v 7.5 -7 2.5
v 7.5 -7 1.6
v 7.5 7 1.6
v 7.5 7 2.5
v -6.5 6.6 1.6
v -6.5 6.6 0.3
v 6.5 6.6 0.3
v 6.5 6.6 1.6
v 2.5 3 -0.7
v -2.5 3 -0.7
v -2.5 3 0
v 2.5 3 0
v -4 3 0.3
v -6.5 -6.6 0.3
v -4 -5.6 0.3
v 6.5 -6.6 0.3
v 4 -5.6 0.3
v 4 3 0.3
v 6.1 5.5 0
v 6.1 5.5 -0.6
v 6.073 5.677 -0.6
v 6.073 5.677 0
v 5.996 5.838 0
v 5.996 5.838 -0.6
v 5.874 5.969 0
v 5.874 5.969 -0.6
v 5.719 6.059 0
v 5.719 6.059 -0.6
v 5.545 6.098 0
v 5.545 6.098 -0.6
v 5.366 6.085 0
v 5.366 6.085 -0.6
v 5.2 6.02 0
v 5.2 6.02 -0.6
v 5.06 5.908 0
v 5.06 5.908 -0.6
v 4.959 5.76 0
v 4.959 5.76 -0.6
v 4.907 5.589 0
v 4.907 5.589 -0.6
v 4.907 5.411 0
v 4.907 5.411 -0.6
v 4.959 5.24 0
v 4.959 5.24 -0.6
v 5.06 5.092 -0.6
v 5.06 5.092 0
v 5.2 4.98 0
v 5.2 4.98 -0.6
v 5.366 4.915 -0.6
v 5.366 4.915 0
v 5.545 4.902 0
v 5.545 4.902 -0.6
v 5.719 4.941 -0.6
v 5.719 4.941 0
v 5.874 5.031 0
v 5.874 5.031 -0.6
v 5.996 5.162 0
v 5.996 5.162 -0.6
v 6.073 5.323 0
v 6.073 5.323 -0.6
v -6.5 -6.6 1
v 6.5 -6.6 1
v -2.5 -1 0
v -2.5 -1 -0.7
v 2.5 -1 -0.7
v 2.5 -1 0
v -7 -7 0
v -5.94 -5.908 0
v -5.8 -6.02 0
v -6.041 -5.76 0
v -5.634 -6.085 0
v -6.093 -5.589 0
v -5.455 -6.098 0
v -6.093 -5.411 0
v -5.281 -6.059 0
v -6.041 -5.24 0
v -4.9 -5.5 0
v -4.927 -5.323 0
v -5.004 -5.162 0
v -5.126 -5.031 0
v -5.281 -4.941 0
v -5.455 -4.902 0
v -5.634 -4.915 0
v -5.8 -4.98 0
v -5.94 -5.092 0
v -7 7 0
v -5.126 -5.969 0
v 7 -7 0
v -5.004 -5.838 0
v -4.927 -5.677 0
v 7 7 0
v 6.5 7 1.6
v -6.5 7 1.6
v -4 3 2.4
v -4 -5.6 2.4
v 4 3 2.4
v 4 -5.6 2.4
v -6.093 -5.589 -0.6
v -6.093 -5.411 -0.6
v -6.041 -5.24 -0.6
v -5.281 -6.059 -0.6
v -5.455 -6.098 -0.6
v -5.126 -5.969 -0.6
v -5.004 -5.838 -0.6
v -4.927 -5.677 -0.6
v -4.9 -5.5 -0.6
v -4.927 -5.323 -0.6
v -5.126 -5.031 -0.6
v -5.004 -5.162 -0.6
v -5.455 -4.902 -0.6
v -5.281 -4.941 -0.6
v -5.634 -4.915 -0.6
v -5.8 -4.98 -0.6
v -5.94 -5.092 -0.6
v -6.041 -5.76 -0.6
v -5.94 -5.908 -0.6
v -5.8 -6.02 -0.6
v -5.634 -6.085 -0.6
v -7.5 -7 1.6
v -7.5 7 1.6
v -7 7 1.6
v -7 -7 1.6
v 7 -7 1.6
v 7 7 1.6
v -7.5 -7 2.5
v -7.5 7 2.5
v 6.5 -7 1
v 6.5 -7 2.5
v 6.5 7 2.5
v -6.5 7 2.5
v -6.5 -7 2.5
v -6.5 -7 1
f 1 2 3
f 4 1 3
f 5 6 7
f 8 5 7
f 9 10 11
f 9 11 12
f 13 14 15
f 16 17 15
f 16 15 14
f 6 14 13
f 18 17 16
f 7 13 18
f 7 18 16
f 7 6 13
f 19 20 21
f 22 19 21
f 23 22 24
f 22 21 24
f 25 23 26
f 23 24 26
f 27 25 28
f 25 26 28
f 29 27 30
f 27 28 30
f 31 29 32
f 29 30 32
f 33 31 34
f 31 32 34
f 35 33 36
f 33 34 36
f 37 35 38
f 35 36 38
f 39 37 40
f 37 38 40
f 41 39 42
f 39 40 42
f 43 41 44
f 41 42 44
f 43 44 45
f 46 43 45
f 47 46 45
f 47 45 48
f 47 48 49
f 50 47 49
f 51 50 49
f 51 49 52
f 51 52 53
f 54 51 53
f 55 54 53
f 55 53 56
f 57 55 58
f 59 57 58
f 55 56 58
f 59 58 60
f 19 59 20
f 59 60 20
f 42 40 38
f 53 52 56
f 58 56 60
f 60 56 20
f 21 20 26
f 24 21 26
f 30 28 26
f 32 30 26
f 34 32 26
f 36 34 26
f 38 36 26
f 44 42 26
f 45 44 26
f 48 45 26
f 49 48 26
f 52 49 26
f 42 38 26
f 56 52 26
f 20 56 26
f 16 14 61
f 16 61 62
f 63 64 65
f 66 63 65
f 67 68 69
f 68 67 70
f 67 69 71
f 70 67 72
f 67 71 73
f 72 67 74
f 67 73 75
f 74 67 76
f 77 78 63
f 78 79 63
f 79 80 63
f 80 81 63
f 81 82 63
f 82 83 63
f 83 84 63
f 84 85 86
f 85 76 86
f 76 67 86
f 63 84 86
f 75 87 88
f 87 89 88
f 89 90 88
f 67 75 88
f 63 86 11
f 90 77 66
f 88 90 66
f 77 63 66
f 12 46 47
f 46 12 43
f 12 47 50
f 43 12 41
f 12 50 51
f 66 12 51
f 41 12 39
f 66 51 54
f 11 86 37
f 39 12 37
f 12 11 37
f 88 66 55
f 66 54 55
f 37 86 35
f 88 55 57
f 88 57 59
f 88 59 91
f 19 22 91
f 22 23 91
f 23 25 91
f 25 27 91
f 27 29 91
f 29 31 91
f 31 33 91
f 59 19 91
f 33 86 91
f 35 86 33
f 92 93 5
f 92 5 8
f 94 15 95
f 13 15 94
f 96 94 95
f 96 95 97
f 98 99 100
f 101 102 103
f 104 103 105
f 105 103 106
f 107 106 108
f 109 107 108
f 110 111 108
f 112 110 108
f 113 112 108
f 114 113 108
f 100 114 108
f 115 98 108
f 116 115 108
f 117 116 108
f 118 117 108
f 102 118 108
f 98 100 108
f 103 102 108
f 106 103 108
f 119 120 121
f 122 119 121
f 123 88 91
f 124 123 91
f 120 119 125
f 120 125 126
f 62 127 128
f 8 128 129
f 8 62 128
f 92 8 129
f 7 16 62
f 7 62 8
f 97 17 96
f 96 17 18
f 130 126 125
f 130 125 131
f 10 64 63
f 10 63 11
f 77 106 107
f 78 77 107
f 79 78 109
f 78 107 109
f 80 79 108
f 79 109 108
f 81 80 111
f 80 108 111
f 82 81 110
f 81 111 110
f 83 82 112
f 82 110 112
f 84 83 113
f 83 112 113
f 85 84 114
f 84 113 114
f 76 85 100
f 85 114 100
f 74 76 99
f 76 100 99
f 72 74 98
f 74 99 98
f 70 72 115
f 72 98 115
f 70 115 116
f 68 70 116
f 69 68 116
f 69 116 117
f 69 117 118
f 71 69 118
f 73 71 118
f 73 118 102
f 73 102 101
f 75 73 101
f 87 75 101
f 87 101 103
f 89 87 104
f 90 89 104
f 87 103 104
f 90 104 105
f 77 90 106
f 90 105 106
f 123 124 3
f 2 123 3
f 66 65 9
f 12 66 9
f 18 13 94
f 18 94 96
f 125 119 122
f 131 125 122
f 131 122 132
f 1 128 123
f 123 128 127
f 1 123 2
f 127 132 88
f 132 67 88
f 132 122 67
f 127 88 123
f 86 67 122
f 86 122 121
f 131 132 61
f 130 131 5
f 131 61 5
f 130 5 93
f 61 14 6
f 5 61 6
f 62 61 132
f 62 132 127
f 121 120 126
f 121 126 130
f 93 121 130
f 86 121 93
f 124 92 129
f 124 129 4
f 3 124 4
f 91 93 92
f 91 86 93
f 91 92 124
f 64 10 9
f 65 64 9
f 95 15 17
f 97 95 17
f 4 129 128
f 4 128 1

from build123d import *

# Parameters (mm, degrees)
BOX046_W          = 13
BOX046_H          = 0.4
BOX046_DEPTH      = 0.7
BOX045_W          = 13
BOX045_H          = 0.4
BOX045_DEPTH      = 1.3
BOX044_W          = 1
BOX044_H          = 14
BOX044_DEPTH      = 0.9
BOX043_W          = 1
BOX043_H          = 14
BOX043_DEPTH      = 0.9
BOX042_W          = 0.5
BOX042_H          = 14
BOX042_DEPTH      = 1.3
BOX041_W          = 0.5
BOX041_H          = 14
BOX041_DEPTH      = 1.3
BOX040_W          = 14
BOX040_H          = 14
BOX040_DEPTH      = 0.3
CYLINDER011_R     = 0.6
CYLINDER011_DEPTH = 0.6
CYLINDER012_R     = 0.6
CYLINDER012_DEPTH = 0.6
BOX055_W          = 8
BOX055_H          = 8.6
BOX055_DEPTH      = 2.1
BOX047_W          = 5
BOX047_H          = 4
BOX047_DEPTH      = 0.7


with BuildPart() as pg1425_front:
    # Box046 → Box046 (new body)
    with BuildSketch(Plane(origin=(-6.5, -7, 0.3), x_dir=(1, 0, 0), z_dir=(0, 0, 1))):
        with Locations((6.5, 0.2)):
            Rectangle(BOX046_W, BOX046_H)
    extrude(amount=BOX046_DEPTH)


with BuildPart() as pg1425_back:
    # Box045 → Box045 (new body)
    with BuildSketch(Plane(origin=(-6.5, 6.6, 0.3), x_dir=(1, 0, 0), z_dir=(0, 0, 1))):
        with Locations((6.5, 0.2)):
            Rectangle(BOX045_W, BOX045_H)
    extrude(amount=BOX045_DEPTH)


with BuildPart() as pg1425_right002:
    # Box044 → Box044 (new body)
    with BuildSketch(Plane(origin=(6.5, -7, 1.6), x_dir=(1, 0, 0), z_dir=(0, 0, 1))):
        with Locations((0.5, 7)):
            Rectangle(BOX044_W, BOX044_H)
    extrude(amount=BOX044_DEPTH)


with BuildPart() as pg1425_left002:
    # Box043 → Box043 (new body)
    with BuildSketch(Plane(origin=(-7.5, -7, 1.6), x_dir=(1, 0, 0), z_dir=(0, 0, 1))):
        with Locations((0.5, 7)):
            Rectangle(BOX043_W, BOX043_H)
    extrude(amount=BOX043_DEPTH)


with BuildPart() as pg1425_right001:
    # Box042 → Box042 (new body)
    with BuildSketch(Plane(origin=(6.5, -7, 0.3), x_dir=(1, 0, 0), z_dir=(0, 0, 1))):
        with Locations((0.25, 7)):
            Rectangle(BOX042_W, BOX042_H)
    extrude(amount=BOX042_DEPTH)


with BuildPart() as pg1425_left001:
    # Box041 → Box041 (new body)
    with BuildSketch(Plane(origin=(-7, -7, 0.3), x_dir=(1, 0, 0), z_dir=(0, 0, 1))):
        with Locations((0.25, 7)):
            Rectangle(BOX041_W, BOX041_H)
    extrude(amount=BOX041_DEPTH)


with BuildPart() as pg1425_bottombase:
    # Box040 → Box040 (new body)
    with BuildSketch(Plane(origin=(-7, -7, 0), x_dir=(1, 0, 0), z_dir=(0, 0, 1))):
        with Locations((7, 7)):
            Rectangle(BOX040_W, BOX040_H)
    extrude(amount=BOX040_DEPTH)


with BuildPart() as pg1425_leg1:
    # Cylinder011 → Cylinder011 (new body)
    with BuildSketch(Plane(origin=(-5.5, -5.5, -0.6), x_dir=(1, 0, 0), z_dir=(0, 0, 1))):
        Circle(CYLINDER011_R)
    extrude(amount=CYLINDER011_DEPTH)


with BuildPart() as pg1425_leg2:
    # Cylinder012 → Cylinder012 (new body)
    with BuildSketch(Plane(origin=(5.5, 5.5, -0.6), x_dir=(1, 0, 0), z_dir=(0, 0, 1))):
        Circle(CYLINDER012_R)
    extrude(amount=CYLINDER012_DEPTH)


with BuildPart() as pg1425_topstem:
    # Box055 → Box055 (new body)
    with BuildSketch(Plane(origin=(-4, -5.6, 0.3), x_dir=(1, 0, 0), z_dir=(0, 0, 1))):
        with Locations((4, 4.3)):
            Rectangle(BOX055_W, BOX055_H)
    extrude(amount=BOX055_DEPTH)


with BuildPart() as pg1425_bottom:
    # Box047 → Box047 (new body)
    with BuildSketch(Plane(origin=(-2.5, -1, -0.7), x_dir=(1, 0, 0), z_dir=(0, 0, 1))):
        with Locations((2.5, 2)):
            Rectangle(BOX047_W, BOX047_H)
    extrude(amount=BOX047_DEPTH)

    # Fusion011: union PG1425_Front, PG1425_Back, PG1425_Right002, PG1425_Left002, PG1425_Right001, PG1425_Left001, PG1425_BottomBase, PG1425_Leg1, PG1425_Leg2, PG1425_TopStem
    add(pg1425_front.part)
    add(pg1425_back.part)
    add(pg1425_right002.part)
    add(pg1425_left002.part)
    add(pg1425_right001.part)
    add(pg1425_left001.part)
    add(pg1425_bottombase.part)
    add(pg1425_leg1.part)
    add(pg1425_leg2.part)
    add(pg1425_topstem.part)


solid = pg1425_bottom.part
